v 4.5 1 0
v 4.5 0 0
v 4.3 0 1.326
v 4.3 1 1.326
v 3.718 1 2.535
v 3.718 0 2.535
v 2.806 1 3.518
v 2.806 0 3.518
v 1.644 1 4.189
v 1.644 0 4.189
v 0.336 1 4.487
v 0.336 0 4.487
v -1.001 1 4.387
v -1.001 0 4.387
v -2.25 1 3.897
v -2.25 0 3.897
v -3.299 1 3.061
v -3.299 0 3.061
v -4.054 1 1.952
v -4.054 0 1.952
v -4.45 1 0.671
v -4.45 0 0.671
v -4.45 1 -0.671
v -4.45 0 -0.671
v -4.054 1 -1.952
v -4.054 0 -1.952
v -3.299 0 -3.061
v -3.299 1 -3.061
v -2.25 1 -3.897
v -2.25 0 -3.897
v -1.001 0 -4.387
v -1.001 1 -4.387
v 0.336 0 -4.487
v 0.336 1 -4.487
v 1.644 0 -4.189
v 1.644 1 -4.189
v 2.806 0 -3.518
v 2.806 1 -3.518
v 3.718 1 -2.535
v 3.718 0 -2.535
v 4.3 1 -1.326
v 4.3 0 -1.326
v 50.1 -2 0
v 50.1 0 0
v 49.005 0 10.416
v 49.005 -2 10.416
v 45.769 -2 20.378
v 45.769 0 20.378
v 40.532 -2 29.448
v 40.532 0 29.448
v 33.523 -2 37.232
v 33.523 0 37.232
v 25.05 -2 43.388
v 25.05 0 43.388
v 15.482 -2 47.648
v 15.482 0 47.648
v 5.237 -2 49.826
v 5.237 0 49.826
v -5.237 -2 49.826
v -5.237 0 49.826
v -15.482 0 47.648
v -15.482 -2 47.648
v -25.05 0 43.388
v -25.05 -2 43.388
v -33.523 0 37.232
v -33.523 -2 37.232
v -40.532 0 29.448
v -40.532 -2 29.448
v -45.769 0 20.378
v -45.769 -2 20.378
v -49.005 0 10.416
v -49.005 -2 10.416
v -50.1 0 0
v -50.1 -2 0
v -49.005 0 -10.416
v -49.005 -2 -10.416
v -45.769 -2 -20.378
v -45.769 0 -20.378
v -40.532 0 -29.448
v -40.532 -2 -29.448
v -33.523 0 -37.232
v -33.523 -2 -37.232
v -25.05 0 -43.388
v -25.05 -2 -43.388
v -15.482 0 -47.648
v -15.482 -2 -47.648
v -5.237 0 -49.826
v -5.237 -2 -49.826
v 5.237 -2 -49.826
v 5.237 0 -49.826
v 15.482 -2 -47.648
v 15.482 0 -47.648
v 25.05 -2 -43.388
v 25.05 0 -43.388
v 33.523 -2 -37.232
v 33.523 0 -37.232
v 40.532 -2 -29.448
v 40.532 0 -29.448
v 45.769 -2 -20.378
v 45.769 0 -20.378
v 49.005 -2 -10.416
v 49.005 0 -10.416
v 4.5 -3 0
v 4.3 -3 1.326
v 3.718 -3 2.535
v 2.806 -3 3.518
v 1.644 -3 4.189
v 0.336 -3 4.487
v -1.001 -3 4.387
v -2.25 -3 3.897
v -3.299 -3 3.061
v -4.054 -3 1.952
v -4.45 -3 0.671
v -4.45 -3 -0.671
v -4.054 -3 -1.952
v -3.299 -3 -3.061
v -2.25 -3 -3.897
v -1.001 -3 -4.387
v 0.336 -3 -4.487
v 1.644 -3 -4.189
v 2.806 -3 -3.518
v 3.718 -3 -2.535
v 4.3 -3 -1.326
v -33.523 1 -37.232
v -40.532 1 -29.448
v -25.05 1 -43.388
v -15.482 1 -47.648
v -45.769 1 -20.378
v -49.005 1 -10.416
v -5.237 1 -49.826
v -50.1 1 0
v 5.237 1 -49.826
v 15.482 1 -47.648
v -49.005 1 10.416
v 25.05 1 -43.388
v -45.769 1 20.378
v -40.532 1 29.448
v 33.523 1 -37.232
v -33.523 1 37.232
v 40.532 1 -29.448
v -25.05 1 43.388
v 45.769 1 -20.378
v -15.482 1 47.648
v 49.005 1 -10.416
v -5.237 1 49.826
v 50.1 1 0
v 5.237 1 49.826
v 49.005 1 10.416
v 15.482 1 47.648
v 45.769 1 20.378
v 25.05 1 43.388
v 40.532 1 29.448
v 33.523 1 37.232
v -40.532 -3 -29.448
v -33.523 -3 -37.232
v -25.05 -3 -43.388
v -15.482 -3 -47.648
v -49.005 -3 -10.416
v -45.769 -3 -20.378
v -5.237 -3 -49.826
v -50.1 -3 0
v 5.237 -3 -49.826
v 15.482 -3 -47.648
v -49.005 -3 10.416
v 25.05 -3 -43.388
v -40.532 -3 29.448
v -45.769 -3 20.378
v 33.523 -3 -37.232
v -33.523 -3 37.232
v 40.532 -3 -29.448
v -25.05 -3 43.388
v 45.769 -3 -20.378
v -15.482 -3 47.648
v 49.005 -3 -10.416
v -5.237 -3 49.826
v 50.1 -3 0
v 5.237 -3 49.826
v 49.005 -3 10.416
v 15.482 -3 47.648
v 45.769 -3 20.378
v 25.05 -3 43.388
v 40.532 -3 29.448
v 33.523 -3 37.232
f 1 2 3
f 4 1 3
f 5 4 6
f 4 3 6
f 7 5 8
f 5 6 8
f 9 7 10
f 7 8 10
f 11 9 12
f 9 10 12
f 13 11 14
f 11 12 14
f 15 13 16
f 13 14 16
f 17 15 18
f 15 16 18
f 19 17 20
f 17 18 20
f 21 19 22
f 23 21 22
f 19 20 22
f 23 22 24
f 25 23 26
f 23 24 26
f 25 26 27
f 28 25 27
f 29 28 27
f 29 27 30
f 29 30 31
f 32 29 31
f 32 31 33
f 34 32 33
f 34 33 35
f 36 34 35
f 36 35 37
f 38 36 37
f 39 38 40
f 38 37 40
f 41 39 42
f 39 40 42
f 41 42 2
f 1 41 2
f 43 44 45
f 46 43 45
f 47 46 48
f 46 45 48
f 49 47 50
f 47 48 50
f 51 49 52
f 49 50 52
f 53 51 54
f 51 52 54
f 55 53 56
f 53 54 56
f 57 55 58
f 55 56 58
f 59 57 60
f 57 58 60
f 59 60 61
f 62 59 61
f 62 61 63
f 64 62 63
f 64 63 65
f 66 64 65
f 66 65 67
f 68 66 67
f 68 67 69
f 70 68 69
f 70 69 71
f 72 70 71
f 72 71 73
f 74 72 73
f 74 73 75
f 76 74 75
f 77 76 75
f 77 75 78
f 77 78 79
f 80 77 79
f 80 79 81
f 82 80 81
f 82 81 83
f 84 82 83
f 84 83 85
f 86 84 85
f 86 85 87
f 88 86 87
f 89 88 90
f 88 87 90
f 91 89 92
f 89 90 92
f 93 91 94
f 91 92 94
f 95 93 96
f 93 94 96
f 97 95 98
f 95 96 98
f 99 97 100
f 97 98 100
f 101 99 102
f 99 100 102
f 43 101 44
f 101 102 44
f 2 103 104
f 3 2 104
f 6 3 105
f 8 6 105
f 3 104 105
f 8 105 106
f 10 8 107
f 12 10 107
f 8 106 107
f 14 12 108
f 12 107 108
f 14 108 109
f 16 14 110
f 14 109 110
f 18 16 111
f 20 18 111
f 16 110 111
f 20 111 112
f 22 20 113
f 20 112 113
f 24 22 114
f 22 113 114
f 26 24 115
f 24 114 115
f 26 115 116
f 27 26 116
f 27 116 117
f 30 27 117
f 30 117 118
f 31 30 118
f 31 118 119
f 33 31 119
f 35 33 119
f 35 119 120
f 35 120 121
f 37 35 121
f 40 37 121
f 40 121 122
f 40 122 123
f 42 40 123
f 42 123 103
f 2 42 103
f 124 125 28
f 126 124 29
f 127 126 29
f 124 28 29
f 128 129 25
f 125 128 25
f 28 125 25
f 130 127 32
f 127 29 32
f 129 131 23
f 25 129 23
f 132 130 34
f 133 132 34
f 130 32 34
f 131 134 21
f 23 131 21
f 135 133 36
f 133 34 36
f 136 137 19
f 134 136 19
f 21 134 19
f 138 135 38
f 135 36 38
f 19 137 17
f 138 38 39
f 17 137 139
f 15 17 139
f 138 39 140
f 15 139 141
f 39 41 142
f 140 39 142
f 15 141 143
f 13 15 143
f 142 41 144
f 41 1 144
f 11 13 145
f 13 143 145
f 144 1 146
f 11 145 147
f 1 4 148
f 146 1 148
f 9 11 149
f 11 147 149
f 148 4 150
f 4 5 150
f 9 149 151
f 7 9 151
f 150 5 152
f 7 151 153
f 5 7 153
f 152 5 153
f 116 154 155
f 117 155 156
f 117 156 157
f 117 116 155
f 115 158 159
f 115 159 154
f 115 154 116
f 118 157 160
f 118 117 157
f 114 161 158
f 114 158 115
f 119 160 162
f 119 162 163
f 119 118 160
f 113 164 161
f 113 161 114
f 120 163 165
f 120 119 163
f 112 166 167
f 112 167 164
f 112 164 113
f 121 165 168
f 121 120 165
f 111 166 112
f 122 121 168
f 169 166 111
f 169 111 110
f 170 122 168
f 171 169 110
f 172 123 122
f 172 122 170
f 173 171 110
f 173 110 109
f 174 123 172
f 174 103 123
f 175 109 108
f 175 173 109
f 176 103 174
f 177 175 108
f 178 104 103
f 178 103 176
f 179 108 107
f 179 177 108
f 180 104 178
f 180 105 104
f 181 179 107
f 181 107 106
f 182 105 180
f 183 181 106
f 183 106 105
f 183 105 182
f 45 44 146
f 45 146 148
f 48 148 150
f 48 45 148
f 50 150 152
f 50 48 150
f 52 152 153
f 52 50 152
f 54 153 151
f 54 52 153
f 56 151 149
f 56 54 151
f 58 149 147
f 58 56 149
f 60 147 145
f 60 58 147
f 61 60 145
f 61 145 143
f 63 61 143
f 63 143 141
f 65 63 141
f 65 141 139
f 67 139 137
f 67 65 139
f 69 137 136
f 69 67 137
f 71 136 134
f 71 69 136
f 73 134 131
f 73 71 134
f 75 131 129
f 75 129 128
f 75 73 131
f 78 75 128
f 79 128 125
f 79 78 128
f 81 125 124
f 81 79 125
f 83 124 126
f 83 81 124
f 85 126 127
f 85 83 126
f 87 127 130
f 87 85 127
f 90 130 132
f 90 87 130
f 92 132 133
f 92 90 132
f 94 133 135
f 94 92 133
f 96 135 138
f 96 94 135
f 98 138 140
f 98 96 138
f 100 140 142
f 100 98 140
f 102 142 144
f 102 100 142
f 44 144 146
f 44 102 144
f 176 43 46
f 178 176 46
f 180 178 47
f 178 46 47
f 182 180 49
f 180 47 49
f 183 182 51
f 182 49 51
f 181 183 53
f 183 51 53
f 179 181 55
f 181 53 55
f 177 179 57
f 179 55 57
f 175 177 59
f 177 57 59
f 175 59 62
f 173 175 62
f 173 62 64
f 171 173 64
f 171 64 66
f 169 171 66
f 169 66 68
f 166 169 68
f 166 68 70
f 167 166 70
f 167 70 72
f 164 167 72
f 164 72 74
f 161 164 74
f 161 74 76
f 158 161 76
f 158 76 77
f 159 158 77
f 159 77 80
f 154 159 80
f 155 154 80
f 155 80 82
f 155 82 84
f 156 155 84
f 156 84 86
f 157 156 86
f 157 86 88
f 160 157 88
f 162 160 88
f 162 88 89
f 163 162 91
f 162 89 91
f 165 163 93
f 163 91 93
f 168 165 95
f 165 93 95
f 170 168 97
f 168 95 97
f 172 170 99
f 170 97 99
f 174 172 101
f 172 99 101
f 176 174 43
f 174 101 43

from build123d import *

# Parameters (mm, degrees)
F0_R      = 50.1
F0_R_2    = 4.5
F1_DEPTH  = 3
F1_FACE_R = 50.1
F2_DEPTH  = 1
F3_R      = 4.5
F4_DEPTH  = 25


with BuildPart() as f1:
    # F0 (on Front) → F1 (new body)
    with BuildSketch(Plane.XZ):
        Circle(F0_R)
        Circle(F0_R_2, mode=Mode.SUBTRACT)
        Circle(F0_R_2)
    extrude(amount=F1_DEPTH)

    # F0 (on Front) + F1_face (on face) → F2 (join)
    with BuildSketch(Plane.XZ):
        Circle(F0_R)
        Circle(F0_R_2, mode=Mode.SUBTRACT)
    with BuildSketch(Plane.XZ.offset(3)):
        Circle(F1_FACE_R)
    extrude(amount=-F2_DEPTH)

    # F3 (on face) → F4 (cut)
    with BuildSketch(Plane.XZ.offset(3)):
        Circle(F3_R)
    extrude(amount=-F4_DEPTH, mode=Mode.SUBTRACT)


solid = f1.part
